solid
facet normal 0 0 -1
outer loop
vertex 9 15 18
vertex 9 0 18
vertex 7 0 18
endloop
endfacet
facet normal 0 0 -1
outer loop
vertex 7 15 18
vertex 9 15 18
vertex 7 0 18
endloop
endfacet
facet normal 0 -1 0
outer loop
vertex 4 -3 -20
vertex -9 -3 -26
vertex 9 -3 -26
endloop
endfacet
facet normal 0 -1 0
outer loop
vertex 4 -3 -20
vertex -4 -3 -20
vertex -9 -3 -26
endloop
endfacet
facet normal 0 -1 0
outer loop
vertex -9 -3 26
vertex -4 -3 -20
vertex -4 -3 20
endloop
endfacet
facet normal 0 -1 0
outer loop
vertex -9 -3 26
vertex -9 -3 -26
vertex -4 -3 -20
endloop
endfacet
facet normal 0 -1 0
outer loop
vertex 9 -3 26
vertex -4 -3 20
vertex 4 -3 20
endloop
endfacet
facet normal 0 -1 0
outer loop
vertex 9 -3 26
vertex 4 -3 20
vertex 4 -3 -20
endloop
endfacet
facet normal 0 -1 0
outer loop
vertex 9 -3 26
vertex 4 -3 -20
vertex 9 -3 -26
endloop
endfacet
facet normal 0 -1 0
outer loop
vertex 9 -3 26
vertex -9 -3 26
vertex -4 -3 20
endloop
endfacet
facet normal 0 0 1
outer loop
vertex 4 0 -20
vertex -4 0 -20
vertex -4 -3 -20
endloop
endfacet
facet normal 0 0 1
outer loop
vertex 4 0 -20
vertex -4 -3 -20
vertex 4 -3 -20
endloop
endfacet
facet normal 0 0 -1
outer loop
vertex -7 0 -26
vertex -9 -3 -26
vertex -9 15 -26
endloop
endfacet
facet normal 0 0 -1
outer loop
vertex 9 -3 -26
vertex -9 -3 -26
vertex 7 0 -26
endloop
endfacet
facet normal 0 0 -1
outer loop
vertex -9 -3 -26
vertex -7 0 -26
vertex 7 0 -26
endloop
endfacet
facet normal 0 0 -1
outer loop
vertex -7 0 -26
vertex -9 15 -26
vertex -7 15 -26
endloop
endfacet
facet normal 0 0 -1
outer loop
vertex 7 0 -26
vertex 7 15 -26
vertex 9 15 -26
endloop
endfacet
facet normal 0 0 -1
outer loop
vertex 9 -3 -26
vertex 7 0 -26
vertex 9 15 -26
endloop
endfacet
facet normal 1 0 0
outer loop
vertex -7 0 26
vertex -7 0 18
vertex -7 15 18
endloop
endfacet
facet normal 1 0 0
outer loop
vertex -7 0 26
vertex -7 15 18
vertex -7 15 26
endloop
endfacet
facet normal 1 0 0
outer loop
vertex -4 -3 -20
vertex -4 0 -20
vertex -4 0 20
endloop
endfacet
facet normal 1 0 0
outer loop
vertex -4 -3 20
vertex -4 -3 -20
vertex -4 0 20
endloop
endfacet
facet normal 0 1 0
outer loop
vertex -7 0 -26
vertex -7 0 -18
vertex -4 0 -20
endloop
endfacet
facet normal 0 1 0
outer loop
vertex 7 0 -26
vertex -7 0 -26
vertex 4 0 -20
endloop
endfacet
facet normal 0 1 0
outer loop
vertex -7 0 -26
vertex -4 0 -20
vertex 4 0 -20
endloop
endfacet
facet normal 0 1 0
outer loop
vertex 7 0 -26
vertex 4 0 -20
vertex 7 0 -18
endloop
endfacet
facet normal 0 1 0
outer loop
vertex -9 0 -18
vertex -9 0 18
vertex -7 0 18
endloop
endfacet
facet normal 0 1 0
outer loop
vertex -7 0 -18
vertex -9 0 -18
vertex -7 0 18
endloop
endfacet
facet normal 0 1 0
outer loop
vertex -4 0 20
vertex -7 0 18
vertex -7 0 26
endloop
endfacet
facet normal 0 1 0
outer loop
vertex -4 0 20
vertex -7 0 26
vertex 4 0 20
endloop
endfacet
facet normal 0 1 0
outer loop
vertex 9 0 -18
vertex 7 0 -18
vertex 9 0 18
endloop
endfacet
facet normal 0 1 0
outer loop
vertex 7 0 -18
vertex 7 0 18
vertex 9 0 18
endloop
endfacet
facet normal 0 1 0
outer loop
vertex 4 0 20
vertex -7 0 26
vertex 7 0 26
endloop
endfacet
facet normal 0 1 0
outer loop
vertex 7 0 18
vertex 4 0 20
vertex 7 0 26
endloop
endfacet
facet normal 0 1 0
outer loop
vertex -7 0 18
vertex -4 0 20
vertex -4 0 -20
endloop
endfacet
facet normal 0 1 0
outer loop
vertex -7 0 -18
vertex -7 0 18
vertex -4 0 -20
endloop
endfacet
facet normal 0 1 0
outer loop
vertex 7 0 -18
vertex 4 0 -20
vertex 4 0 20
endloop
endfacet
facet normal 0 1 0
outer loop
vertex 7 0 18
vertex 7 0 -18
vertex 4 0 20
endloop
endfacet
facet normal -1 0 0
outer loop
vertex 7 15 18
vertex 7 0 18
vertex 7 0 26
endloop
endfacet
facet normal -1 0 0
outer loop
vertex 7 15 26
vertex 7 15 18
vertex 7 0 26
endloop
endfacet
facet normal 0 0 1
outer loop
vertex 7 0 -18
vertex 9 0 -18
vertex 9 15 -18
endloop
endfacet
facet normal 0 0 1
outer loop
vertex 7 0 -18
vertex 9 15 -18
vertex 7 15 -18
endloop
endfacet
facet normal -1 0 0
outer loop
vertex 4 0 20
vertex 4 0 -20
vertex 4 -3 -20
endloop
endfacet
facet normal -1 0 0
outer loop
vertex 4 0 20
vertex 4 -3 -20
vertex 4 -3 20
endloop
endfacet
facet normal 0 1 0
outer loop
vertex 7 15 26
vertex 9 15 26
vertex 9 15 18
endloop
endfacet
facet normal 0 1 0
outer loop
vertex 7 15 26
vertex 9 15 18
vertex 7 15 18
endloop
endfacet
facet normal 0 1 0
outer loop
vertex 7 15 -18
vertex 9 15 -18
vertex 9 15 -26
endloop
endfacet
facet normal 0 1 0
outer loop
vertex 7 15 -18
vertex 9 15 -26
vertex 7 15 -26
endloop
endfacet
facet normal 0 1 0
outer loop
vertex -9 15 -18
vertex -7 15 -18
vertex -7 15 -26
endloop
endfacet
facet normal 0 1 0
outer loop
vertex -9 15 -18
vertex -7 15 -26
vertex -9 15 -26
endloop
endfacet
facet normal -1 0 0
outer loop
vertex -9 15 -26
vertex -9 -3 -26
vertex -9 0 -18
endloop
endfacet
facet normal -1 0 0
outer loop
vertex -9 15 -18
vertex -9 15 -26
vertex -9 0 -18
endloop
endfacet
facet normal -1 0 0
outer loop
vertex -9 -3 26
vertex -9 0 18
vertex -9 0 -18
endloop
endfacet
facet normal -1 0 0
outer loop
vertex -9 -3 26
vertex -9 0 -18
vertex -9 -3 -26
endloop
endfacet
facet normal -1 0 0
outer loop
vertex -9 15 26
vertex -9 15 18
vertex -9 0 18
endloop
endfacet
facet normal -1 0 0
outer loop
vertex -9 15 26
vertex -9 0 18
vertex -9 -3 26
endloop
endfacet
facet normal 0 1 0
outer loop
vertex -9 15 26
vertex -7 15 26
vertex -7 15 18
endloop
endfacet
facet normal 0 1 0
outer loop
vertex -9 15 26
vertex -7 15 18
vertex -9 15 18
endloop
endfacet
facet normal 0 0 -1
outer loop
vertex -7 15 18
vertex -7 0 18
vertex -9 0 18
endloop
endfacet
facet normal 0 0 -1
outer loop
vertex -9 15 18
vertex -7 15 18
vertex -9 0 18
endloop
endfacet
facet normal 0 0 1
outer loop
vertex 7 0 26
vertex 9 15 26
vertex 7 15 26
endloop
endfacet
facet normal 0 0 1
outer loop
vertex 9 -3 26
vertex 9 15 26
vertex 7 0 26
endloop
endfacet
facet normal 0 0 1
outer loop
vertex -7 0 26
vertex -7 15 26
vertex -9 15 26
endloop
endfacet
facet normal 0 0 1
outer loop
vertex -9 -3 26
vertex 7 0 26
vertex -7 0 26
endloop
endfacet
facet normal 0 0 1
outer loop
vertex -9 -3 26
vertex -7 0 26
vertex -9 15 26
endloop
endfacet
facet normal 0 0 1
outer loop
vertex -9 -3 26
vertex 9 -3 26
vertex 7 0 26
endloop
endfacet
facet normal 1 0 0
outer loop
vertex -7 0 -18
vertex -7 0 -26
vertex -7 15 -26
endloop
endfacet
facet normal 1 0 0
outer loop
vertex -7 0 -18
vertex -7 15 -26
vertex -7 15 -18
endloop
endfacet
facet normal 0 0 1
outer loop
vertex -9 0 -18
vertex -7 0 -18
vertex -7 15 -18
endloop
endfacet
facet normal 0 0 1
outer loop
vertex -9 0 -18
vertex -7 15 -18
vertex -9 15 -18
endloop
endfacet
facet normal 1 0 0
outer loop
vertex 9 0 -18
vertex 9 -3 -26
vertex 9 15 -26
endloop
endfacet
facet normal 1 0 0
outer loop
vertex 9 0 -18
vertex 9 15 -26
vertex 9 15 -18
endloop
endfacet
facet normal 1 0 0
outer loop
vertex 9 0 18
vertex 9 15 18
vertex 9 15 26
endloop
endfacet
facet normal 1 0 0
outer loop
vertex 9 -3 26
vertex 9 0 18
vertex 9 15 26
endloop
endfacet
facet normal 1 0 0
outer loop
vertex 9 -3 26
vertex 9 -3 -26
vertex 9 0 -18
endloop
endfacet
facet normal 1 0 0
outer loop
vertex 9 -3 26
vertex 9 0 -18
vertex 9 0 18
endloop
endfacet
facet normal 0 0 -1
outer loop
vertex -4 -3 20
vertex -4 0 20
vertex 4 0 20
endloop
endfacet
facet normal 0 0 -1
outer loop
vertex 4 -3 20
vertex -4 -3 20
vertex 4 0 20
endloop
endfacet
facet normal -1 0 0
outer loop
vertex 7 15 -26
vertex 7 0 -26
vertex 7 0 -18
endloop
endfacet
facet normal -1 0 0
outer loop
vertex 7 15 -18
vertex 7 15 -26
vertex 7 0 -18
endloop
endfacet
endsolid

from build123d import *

# Parameters (mm, degrees)
F0_W     = 18
F0_H     = 52
F0_W_2   = 8
F0_H_2   = 40
F1_DEPTH = 3
F2_W     = 2
F2_H     = 8
F3_DEPTH = 15


with BuildPart() as f1:
    # F0 (on Front) → F1 (new body)
    with BuildSketch(Plane.XZ):
        Rectangle(F0_W, F0_H)
        Rectangle(F0_W_2, F0_H_2, mode=Mode.SUBTRACT)
    extrude(amount=F1_DEPTH)

    # F2 (on face) → F3 (join)
    with BuildSketch(Plane(origin=(0, 0, 0), x_dir=(-1, 0, 0), z_dir=(0, 1, 0))):
        with Locations((-8, 22)):
            Rectangle(F2_W, F2_H)
        with Locations((8, 22)):
            Rectangle(F2_W, F2_H)
        with Locations((8, -22)):
            Rectangle(F2_W, F2_H)
        with Locations((-8, -22)):
            Rectangle(F2_W, F2_H)
    extrude(amount=F3_DEPTH)


solid = f1.part
